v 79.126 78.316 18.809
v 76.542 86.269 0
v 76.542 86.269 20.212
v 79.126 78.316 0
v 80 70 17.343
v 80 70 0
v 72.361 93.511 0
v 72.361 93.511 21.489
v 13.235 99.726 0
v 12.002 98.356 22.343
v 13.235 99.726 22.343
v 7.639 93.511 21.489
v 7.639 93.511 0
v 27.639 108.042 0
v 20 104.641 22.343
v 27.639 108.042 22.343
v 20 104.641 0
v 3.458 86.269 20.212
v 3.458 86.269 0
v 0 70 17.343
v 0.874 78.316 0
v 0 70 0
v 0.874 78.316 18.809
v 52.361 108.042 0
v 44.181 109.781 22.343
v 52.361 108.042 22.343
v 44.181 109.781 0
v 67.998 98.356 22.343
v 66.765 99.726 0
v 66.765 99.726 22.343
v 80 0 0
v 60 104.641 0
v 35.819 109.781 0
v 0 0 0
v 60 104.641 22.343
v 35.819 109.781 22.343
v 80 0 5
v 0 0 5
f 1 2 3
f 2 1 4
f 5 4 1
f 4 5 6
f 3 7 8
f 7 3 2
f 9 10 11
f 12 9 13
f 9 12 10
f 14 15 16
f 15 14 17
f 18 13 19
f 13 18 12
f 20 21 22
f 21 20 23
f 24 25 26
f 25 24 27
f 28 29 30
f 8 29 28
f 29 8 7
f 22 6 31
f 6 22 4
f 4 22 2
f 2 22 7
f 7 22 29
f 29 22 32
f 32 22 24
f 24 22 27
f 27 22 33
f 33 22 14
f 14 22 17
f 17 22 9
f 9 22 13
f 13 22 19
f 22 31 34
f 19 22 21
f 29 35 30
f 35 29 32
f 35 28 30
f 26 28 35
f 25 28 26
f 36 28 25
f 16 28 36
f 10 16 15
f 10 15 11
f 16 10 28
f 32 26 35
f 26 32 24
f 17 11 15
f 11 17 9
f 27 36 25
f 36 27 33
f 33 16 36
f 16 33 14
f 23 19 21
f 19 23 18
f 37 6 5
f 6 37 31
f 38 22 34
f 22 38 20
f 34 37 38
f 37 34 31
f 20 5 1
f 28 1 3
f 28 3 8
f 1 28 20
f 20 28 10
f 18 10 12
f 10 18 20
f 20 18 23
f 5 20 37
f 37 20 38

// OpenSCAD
// [FL_INDEX: keywords="openscad, 3d_parametric, Customizable_Heel_Lift, csg_solid" | COT="Parametric OpenSCAD design from 3DCodeverse"]
// Title: Customizable Heel Lift

//Customizable Foot Wedge

//Variables
// Define the width of your heel
heel_width =80; //Numeric value of heel width 

//Define the length of the wedge past your heel
l=70; //Length of the cube

//Define the height of the front of the wedge
h=5; //Numeric value of height of insert from front of wedge

//Define the angle of the wedge
wedge_angle=10; //[0:20]

//Calculated variables
r=heel_width/2; //Radius of the Circle
total_l = r+l; //Total Length


foot_wedge();

module foot_wedge(){
difference(){
union(){
translate([r,l,0])cylinder(h*2+l*tan(wedge_angle),r,r, $fs=1);
translate([0,0,0])cube([r*2,l,h*2+l*tan(wedge_angle)]);
}
translate([-1,0,h])rotate([wedge_angle,0,0])cube([r*2+10,total_l*2,h*2+l*tan(wedge_angle)]);
translate([0,-total_l,-1])cube([r*2,total_l,(h*2+l*tan(wedge_angle))+2]);
}
}
